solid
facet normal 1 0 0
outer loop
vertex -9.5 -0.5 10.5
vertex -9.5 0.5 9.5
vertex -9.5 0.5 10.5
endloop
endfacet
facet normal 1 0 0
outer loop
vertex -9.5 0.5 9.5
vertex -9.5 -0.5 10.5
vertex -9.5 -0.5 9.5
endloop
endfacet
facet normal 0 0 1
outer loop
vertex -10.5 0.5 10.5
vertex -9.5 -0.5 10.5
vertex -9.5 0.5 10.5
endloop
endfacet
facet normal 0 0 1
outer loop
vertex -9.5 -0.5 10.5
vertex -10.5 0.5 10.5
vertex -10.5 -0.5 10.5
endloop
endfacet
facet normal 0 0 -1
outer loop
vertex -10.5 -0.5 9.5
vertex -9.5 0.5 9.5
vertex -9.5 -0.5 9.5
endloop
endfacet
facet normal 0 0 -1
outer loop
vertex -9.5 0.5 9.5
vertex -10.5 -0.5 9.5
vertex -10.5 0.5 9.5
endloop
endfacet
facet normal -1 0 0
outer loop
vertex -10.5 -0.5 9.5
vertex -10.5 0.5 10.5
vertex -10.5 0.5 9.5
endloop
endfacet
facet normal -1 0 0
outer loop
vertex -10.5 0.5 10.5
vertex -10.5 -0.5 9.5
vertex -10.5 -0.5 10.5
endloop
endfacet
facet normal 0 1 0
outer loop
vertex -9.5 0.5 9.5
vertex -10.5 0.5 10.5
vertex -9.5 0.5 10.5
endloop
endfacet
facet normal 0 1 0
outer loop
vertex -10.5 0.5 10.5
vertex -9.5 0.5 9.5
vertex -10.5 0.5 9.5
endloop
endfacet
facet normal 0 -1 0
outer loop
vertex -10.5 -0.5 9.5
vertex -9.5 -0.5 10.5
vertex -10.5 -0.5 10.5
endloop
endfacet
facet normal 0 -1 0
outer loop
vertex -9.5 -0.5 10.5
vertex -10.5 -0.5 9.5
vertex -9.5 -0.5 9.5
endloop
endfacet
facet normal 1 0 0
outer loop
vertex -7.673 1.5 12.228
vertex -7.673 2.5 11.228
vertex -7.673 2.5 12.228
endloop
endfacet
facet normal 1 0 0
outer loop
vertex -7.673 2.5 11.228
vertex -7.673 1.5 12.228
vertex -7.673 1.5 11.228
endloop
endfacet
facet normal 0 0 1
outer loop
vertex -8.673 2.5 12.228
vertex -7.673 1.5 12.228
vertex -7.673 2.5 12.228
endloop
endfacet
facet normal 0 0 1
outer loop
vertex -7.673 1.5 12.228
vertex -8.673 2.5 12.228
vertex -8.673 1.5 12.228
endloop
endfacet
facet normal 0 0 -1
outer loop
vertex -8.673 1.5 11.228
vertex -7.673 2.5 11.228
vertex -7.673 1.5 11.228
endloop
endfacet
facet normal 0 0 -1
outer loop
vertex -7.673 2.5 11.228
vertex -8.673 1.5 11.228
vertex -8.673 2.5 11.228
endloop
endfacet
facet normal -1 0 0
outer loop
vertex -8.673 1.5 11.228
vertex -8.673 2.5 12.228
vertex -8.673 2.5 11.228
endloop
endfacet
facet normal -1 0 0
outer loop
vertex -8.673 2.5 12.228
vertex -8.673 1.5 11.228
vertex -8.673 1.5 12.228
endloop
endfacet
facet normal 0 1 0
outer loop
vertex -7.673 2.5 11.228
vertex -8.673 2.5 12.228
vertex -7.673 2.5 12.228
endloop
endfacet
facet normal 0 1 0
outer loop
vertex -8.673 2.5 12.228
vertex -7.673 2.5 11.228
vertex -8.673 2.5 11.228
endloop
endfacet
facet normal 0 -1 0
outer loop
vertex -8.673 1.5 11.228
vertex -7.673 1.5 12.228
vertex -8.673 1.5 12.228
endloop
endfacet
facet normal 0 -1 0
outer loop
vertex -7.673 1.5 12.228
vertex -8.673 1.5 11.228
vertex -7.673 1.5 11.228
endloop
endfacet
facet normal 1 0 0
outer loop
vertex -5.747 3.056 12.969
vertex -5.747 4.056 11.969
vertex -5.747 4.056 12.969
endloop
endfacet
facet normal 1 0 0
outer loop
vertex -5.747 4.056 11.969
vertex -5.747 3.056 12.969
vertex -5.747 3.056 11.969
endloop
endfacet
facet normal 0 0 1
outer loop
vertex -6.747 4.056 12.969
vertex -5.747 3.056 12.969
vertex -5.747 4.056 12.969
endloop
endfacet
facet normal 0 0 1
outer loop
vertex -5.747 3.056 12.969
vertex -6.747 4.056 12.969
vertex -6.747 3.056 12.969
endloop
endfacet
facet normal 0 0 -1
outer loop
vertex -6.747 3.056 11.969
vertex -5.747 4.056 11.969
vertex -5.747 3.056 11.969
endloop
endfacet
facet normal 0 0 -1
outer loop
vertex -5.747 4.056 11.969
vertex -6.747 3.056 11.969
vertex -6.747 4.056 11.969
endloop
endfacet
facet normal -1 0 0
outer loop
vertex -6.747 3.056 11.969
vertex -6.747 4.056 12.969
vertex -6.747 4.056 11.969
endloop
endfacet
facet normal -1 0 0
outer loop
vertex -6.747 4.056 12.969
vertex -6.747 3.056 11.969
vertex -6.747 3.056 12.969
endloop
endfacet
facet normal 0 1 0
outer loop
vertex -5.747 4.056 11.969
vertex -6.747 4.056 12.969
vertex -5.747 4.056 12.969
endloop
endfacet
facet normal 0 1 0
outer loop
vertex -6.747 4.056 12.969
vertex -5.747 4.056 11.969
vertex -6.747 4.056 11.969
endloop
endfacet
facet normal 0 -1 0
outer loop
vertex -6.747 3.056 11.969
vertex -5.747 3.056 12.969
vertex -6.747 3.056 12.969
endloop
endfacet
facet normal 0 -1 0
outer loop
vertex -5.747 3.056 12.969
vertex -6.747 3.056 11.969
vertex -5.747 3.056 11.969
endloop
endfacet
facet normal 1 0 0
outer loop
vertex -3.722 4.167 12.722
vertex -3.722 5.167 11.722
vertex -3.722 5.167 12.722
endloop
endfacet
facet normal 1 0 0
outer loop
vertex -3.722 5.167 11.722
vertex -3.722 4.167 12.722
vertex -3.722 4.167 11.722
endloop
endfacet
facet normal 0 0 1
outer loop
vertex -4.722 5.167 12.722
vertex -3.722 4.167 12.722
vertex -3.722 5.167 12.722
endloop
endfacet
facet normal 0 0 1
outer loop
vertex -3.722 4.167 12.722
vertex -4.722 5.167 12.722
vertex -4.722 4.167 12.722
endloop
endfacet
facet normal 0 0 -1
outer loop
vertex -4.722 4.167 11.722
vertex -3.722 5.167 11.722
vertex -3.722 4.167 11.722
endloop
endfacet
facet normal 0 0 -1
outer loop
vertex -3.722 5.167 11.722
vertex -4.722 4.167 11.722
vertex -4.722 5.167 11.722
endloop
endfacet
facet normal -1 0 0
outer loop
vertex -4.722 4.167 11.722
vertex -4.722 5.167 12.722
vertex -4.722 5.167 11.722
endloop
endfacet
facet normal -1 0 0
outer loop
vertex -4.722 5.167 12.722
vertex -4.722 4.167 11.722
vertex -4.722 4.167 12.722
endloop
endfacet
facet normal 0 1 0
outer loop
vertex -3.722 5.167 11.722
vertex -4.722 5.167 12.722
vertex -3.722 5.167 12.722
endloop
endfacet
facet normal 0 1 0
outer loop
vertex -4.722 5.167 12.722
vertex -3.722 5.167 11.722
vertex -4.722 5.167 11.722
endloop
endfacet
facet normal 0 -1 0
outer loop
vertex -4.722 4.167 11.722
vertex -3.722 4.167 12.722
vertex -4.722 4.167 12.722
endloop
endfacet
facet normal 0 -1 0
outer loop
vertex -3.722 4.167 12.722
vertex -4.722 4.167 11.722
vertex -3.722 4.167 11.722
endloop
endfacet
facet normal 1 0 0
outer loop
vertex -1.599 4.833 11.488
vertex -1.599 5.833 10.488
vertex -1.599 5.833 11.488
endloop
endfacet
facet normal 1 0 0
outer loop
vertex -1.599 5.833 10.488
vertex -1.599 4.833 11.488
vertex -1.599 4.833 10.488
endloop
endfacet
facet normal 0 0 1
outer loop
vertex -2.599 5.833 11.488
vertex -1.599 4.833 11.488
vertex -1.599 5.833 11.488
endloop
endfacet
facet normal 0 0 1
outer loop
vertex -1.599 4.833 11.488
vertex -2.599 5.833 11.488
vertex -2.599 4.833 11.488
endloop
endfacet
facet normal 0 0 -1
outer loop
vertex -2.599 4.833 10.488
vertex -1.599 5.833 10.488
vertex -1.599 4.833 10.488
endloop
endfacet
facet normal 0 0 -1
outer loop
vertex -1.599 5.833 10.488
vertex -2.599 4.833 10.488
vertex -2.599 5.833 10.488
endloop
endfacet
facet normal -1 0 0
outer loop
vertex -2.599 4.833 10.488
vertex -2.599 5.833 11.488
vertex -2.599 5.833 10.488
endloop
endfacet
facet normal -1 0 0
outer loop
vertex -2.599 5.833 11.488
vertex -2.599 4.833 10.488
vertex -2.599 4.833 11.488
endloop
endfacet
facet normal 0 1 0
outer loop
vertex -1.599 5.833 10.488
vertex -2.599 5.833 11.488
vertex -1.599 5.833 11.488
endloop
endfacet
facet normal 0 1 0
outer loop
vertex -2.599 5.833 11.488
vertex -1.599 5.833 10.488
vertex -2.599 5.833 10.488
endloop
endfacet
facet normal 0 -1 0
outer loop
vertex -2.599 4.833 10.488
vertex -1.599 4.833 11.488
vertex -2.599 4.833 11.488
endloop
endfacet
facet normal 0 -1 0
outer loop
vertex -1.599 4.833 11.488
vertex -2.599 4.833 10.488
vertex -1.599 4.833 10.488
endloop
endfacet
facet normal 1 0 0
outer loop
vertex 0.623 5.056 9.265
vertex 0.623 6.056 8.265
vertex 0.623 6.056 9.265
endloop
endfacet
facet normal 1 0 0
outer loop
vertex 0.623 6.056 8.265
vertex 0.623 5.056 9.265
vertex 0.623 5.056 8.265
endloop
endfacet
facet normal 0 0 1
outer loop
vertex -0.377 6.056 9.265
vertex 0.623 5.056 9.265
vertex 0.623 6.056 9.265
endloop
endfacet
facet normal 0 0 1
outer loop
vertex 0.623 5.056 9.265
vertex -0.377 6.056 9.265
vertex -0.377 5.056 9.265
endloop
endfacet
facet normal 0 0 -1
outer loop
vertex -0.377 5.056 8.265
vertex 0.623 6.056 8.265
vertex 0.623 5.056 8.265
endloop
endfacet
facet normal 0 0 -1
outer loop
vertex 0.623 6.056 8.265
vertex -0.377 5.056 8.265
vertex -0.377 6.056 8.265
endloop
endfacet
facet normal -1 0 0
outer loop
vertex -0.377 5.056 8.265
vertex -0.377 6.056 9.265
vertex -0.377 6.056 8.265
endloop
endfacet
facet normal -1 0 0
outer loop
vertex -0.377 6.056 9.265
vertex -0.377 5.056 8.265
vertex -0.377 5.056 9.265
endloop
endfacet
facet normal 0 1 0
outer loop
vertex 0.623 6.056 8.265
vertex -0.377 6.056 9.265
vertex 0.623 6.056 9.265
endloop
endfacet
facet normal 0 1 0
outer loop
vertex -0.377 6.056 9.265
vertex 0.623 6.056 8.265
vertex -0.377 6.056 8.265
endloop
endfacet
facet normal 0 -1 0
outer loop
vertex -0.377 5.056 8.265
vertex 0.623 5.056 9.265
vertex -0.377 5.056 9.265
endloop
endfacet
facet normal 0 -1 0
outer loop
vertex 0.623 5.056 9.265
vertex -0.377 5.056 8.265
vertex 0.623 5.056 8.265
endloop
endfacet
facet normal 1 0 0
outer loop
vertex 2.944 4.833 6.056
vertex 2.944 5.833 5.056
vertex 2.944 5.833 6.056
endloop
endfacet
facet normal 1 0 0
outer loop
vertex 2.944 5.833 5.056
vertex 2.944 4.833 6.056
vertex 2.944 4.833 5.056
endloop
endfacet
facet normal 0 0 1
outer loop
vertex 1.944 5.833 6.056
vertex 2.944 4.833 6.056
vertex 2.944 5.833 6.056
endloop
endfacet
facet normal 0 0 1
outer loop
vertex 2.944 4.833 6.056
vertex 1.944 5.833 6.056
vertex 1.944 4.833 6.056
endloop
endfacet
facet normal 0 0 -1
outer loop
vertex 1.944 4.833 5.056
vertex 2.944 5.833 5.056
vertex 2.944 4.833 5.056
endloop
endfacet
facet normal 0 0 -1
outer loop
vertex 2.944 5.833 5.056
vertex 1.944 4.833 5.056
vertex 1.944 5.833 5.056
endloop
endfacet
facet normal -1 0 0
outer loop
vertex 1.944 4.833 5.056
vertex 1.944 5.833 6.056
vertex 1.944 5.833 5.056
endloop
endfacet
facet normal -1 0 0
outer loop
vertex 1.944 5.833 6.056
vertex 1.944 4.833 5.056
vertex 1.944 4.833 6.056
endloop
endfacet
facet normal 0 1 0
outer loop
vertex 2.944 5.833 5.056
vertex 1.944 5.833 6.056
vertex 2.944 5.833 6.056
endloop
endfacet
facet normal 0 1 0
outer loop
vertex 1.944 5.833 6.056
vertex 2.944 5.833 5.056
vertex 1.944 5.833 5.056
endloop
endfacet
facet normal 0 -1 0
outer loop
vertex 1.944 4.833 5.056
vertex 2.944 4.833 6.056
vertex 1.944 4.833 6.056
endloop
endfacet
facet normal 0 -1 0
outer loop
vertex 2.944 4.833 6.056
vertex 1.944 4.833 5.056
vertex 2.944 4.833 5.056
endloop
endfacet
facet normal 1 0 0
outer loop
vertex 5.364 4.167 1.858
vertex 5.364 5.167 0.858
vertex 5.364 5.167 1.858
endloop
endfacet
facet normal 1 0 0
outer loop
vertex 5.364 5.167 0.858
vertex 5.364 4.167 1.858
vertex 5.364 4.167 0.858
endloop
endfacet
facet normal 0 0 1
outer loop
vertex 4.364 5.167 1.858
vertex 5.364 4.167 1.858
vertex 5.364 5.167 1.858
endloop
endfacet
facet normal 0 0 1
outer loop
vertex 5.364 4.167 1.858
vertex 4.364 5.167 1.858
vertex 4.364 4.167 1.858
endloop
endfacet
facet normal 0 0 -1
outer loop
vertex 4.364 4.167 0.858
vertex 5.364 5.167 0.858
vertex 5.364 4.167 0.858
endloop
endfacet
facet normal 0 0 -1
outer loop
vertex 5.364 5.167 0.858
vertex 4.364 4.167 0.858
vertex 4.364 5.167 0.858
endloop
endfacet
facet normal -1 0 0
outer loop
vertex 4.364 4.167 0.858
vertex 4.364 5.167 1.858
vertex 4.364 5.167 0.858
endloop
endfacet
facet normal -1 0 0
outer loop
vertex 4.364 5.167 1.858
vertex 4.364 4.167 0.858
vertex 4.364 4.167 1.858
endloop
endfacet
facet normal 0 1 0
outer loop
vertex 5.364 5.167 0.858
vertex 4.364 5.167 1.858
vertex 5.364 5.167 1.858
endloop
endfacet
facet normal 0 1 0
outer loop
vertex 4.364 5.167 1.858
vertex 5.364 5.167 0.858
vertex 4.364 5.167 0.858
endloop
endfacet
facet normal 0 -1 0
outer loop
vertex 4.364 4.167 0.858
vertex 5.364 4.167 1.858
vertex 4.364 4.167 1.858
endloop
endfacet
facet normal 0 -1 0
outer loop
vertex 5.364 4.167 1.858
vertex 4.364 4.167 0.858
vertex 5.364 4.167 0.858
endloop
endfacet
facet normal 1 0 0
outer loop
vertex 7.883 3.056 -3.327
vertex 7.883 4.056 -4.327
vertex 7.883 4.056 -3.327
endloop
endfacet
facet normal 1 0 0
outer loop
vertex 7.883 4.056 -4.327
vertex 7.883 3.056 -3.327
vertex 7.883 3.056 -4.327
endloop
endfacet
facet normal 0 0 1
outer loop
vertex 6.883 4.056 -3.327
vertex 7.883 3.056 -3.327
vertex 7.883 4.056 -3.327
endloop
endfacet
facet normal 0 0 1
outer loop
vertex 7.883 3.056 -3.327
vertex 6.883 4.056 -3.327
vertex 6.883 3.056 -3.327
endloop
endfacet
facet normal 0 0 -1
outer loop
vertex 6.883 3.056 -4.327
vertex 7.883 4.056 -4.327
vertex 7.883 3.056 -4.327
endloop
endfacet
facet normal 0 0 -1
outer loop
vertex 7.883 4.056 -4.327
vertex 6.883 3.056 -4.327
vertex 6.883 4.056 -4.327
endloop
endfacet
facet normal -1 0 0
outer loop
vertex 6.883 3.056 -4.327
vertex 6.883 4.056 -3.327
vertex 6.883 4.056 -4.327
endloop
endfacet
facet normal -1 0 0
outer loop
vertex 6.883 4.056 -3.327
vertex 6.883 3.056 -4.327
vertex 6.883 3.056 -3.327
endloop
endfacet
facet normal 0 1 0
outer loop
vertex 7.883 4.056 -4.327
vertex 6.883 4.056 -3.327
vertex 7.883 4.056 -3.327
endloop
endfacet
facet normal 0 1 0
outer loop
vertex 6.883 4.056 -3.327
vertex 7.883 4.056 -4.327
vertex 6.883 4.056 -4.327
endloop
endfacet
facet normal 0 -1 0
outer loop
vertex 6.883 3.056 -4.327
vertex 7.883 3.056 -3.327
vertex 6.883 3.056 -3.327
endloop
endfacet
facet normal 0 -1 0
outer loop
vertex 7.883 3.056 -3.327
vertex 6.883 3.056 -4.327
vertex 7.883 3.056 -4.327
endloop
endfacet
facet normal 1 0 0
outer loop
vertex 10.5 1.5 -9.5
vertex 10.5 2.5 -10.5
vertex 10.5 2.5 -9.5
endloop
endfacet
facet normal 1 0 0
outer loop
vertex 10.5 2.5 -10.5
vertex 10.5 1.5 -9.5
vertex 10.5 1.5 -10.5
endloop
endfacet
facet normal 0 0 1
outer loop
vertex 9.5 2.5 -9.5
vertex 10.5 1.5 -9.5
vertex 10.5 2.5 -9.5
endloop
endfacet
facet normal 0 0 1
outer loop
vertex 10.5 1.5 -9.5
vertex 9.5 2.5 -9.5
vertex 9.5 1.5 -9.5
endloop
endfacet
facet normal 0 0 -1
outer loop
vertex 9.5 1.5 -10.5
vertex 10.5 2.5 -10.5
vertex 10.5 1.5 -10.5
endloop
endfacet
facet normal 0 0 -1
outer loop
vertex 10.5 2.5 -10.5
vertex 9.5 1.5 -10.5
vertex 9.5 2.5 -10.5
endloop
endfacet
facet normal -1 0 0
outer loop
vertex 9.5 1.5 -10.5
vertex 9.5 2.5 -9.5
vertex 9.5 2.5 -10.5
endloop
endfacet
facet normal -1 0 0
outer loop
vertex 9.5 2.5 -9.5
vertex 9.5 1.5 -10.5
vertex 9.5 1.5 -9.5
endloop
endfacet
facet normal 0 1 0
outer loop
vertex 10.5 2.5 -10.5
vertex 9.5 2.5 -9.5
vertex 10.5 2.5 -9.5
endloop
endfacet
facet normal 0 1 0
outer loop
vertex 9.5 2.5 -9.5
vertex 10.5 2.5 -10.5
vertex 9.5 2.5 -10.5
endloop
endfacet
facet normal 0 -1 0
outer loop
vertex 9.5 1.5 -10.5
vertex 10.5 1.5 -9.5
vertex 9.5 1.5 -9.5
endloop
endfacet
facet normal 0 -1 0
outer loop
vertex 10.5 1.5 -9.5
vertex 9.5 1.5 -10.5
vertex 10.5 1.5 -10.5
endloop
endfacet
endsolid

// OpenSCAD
function bezier_coordinate(t, p0, p1, p2) = (
    let(
        u  = 1.0 - t,
        q0 = p0 * u + p1 * t,
        q1 = p1 * u + p2 * t
    )
    q0 * u + q1 * t
);

function bezier_point(t, p0, p1, p2) = [
    for(i = [0:len(p0)-1]) (
        bezier_coordinate(t, p0[i], p1[i], p2[i])
    )
];

function bezier_points(p0, p1, p2, count = 10) = [
    let(max = count - 1)
    for(i = [0 : max]) let(t = i / max) (
        bezier_point(t, p0, p1, p2)
    )
];

p0 = [-10, 0, 10];
p1 = [-2, 10,  20];
p2 = [10,  2, -10];

for (p = bezier_points(p0, p1, p2)) {
    translate(p) cube(1, true);
}
